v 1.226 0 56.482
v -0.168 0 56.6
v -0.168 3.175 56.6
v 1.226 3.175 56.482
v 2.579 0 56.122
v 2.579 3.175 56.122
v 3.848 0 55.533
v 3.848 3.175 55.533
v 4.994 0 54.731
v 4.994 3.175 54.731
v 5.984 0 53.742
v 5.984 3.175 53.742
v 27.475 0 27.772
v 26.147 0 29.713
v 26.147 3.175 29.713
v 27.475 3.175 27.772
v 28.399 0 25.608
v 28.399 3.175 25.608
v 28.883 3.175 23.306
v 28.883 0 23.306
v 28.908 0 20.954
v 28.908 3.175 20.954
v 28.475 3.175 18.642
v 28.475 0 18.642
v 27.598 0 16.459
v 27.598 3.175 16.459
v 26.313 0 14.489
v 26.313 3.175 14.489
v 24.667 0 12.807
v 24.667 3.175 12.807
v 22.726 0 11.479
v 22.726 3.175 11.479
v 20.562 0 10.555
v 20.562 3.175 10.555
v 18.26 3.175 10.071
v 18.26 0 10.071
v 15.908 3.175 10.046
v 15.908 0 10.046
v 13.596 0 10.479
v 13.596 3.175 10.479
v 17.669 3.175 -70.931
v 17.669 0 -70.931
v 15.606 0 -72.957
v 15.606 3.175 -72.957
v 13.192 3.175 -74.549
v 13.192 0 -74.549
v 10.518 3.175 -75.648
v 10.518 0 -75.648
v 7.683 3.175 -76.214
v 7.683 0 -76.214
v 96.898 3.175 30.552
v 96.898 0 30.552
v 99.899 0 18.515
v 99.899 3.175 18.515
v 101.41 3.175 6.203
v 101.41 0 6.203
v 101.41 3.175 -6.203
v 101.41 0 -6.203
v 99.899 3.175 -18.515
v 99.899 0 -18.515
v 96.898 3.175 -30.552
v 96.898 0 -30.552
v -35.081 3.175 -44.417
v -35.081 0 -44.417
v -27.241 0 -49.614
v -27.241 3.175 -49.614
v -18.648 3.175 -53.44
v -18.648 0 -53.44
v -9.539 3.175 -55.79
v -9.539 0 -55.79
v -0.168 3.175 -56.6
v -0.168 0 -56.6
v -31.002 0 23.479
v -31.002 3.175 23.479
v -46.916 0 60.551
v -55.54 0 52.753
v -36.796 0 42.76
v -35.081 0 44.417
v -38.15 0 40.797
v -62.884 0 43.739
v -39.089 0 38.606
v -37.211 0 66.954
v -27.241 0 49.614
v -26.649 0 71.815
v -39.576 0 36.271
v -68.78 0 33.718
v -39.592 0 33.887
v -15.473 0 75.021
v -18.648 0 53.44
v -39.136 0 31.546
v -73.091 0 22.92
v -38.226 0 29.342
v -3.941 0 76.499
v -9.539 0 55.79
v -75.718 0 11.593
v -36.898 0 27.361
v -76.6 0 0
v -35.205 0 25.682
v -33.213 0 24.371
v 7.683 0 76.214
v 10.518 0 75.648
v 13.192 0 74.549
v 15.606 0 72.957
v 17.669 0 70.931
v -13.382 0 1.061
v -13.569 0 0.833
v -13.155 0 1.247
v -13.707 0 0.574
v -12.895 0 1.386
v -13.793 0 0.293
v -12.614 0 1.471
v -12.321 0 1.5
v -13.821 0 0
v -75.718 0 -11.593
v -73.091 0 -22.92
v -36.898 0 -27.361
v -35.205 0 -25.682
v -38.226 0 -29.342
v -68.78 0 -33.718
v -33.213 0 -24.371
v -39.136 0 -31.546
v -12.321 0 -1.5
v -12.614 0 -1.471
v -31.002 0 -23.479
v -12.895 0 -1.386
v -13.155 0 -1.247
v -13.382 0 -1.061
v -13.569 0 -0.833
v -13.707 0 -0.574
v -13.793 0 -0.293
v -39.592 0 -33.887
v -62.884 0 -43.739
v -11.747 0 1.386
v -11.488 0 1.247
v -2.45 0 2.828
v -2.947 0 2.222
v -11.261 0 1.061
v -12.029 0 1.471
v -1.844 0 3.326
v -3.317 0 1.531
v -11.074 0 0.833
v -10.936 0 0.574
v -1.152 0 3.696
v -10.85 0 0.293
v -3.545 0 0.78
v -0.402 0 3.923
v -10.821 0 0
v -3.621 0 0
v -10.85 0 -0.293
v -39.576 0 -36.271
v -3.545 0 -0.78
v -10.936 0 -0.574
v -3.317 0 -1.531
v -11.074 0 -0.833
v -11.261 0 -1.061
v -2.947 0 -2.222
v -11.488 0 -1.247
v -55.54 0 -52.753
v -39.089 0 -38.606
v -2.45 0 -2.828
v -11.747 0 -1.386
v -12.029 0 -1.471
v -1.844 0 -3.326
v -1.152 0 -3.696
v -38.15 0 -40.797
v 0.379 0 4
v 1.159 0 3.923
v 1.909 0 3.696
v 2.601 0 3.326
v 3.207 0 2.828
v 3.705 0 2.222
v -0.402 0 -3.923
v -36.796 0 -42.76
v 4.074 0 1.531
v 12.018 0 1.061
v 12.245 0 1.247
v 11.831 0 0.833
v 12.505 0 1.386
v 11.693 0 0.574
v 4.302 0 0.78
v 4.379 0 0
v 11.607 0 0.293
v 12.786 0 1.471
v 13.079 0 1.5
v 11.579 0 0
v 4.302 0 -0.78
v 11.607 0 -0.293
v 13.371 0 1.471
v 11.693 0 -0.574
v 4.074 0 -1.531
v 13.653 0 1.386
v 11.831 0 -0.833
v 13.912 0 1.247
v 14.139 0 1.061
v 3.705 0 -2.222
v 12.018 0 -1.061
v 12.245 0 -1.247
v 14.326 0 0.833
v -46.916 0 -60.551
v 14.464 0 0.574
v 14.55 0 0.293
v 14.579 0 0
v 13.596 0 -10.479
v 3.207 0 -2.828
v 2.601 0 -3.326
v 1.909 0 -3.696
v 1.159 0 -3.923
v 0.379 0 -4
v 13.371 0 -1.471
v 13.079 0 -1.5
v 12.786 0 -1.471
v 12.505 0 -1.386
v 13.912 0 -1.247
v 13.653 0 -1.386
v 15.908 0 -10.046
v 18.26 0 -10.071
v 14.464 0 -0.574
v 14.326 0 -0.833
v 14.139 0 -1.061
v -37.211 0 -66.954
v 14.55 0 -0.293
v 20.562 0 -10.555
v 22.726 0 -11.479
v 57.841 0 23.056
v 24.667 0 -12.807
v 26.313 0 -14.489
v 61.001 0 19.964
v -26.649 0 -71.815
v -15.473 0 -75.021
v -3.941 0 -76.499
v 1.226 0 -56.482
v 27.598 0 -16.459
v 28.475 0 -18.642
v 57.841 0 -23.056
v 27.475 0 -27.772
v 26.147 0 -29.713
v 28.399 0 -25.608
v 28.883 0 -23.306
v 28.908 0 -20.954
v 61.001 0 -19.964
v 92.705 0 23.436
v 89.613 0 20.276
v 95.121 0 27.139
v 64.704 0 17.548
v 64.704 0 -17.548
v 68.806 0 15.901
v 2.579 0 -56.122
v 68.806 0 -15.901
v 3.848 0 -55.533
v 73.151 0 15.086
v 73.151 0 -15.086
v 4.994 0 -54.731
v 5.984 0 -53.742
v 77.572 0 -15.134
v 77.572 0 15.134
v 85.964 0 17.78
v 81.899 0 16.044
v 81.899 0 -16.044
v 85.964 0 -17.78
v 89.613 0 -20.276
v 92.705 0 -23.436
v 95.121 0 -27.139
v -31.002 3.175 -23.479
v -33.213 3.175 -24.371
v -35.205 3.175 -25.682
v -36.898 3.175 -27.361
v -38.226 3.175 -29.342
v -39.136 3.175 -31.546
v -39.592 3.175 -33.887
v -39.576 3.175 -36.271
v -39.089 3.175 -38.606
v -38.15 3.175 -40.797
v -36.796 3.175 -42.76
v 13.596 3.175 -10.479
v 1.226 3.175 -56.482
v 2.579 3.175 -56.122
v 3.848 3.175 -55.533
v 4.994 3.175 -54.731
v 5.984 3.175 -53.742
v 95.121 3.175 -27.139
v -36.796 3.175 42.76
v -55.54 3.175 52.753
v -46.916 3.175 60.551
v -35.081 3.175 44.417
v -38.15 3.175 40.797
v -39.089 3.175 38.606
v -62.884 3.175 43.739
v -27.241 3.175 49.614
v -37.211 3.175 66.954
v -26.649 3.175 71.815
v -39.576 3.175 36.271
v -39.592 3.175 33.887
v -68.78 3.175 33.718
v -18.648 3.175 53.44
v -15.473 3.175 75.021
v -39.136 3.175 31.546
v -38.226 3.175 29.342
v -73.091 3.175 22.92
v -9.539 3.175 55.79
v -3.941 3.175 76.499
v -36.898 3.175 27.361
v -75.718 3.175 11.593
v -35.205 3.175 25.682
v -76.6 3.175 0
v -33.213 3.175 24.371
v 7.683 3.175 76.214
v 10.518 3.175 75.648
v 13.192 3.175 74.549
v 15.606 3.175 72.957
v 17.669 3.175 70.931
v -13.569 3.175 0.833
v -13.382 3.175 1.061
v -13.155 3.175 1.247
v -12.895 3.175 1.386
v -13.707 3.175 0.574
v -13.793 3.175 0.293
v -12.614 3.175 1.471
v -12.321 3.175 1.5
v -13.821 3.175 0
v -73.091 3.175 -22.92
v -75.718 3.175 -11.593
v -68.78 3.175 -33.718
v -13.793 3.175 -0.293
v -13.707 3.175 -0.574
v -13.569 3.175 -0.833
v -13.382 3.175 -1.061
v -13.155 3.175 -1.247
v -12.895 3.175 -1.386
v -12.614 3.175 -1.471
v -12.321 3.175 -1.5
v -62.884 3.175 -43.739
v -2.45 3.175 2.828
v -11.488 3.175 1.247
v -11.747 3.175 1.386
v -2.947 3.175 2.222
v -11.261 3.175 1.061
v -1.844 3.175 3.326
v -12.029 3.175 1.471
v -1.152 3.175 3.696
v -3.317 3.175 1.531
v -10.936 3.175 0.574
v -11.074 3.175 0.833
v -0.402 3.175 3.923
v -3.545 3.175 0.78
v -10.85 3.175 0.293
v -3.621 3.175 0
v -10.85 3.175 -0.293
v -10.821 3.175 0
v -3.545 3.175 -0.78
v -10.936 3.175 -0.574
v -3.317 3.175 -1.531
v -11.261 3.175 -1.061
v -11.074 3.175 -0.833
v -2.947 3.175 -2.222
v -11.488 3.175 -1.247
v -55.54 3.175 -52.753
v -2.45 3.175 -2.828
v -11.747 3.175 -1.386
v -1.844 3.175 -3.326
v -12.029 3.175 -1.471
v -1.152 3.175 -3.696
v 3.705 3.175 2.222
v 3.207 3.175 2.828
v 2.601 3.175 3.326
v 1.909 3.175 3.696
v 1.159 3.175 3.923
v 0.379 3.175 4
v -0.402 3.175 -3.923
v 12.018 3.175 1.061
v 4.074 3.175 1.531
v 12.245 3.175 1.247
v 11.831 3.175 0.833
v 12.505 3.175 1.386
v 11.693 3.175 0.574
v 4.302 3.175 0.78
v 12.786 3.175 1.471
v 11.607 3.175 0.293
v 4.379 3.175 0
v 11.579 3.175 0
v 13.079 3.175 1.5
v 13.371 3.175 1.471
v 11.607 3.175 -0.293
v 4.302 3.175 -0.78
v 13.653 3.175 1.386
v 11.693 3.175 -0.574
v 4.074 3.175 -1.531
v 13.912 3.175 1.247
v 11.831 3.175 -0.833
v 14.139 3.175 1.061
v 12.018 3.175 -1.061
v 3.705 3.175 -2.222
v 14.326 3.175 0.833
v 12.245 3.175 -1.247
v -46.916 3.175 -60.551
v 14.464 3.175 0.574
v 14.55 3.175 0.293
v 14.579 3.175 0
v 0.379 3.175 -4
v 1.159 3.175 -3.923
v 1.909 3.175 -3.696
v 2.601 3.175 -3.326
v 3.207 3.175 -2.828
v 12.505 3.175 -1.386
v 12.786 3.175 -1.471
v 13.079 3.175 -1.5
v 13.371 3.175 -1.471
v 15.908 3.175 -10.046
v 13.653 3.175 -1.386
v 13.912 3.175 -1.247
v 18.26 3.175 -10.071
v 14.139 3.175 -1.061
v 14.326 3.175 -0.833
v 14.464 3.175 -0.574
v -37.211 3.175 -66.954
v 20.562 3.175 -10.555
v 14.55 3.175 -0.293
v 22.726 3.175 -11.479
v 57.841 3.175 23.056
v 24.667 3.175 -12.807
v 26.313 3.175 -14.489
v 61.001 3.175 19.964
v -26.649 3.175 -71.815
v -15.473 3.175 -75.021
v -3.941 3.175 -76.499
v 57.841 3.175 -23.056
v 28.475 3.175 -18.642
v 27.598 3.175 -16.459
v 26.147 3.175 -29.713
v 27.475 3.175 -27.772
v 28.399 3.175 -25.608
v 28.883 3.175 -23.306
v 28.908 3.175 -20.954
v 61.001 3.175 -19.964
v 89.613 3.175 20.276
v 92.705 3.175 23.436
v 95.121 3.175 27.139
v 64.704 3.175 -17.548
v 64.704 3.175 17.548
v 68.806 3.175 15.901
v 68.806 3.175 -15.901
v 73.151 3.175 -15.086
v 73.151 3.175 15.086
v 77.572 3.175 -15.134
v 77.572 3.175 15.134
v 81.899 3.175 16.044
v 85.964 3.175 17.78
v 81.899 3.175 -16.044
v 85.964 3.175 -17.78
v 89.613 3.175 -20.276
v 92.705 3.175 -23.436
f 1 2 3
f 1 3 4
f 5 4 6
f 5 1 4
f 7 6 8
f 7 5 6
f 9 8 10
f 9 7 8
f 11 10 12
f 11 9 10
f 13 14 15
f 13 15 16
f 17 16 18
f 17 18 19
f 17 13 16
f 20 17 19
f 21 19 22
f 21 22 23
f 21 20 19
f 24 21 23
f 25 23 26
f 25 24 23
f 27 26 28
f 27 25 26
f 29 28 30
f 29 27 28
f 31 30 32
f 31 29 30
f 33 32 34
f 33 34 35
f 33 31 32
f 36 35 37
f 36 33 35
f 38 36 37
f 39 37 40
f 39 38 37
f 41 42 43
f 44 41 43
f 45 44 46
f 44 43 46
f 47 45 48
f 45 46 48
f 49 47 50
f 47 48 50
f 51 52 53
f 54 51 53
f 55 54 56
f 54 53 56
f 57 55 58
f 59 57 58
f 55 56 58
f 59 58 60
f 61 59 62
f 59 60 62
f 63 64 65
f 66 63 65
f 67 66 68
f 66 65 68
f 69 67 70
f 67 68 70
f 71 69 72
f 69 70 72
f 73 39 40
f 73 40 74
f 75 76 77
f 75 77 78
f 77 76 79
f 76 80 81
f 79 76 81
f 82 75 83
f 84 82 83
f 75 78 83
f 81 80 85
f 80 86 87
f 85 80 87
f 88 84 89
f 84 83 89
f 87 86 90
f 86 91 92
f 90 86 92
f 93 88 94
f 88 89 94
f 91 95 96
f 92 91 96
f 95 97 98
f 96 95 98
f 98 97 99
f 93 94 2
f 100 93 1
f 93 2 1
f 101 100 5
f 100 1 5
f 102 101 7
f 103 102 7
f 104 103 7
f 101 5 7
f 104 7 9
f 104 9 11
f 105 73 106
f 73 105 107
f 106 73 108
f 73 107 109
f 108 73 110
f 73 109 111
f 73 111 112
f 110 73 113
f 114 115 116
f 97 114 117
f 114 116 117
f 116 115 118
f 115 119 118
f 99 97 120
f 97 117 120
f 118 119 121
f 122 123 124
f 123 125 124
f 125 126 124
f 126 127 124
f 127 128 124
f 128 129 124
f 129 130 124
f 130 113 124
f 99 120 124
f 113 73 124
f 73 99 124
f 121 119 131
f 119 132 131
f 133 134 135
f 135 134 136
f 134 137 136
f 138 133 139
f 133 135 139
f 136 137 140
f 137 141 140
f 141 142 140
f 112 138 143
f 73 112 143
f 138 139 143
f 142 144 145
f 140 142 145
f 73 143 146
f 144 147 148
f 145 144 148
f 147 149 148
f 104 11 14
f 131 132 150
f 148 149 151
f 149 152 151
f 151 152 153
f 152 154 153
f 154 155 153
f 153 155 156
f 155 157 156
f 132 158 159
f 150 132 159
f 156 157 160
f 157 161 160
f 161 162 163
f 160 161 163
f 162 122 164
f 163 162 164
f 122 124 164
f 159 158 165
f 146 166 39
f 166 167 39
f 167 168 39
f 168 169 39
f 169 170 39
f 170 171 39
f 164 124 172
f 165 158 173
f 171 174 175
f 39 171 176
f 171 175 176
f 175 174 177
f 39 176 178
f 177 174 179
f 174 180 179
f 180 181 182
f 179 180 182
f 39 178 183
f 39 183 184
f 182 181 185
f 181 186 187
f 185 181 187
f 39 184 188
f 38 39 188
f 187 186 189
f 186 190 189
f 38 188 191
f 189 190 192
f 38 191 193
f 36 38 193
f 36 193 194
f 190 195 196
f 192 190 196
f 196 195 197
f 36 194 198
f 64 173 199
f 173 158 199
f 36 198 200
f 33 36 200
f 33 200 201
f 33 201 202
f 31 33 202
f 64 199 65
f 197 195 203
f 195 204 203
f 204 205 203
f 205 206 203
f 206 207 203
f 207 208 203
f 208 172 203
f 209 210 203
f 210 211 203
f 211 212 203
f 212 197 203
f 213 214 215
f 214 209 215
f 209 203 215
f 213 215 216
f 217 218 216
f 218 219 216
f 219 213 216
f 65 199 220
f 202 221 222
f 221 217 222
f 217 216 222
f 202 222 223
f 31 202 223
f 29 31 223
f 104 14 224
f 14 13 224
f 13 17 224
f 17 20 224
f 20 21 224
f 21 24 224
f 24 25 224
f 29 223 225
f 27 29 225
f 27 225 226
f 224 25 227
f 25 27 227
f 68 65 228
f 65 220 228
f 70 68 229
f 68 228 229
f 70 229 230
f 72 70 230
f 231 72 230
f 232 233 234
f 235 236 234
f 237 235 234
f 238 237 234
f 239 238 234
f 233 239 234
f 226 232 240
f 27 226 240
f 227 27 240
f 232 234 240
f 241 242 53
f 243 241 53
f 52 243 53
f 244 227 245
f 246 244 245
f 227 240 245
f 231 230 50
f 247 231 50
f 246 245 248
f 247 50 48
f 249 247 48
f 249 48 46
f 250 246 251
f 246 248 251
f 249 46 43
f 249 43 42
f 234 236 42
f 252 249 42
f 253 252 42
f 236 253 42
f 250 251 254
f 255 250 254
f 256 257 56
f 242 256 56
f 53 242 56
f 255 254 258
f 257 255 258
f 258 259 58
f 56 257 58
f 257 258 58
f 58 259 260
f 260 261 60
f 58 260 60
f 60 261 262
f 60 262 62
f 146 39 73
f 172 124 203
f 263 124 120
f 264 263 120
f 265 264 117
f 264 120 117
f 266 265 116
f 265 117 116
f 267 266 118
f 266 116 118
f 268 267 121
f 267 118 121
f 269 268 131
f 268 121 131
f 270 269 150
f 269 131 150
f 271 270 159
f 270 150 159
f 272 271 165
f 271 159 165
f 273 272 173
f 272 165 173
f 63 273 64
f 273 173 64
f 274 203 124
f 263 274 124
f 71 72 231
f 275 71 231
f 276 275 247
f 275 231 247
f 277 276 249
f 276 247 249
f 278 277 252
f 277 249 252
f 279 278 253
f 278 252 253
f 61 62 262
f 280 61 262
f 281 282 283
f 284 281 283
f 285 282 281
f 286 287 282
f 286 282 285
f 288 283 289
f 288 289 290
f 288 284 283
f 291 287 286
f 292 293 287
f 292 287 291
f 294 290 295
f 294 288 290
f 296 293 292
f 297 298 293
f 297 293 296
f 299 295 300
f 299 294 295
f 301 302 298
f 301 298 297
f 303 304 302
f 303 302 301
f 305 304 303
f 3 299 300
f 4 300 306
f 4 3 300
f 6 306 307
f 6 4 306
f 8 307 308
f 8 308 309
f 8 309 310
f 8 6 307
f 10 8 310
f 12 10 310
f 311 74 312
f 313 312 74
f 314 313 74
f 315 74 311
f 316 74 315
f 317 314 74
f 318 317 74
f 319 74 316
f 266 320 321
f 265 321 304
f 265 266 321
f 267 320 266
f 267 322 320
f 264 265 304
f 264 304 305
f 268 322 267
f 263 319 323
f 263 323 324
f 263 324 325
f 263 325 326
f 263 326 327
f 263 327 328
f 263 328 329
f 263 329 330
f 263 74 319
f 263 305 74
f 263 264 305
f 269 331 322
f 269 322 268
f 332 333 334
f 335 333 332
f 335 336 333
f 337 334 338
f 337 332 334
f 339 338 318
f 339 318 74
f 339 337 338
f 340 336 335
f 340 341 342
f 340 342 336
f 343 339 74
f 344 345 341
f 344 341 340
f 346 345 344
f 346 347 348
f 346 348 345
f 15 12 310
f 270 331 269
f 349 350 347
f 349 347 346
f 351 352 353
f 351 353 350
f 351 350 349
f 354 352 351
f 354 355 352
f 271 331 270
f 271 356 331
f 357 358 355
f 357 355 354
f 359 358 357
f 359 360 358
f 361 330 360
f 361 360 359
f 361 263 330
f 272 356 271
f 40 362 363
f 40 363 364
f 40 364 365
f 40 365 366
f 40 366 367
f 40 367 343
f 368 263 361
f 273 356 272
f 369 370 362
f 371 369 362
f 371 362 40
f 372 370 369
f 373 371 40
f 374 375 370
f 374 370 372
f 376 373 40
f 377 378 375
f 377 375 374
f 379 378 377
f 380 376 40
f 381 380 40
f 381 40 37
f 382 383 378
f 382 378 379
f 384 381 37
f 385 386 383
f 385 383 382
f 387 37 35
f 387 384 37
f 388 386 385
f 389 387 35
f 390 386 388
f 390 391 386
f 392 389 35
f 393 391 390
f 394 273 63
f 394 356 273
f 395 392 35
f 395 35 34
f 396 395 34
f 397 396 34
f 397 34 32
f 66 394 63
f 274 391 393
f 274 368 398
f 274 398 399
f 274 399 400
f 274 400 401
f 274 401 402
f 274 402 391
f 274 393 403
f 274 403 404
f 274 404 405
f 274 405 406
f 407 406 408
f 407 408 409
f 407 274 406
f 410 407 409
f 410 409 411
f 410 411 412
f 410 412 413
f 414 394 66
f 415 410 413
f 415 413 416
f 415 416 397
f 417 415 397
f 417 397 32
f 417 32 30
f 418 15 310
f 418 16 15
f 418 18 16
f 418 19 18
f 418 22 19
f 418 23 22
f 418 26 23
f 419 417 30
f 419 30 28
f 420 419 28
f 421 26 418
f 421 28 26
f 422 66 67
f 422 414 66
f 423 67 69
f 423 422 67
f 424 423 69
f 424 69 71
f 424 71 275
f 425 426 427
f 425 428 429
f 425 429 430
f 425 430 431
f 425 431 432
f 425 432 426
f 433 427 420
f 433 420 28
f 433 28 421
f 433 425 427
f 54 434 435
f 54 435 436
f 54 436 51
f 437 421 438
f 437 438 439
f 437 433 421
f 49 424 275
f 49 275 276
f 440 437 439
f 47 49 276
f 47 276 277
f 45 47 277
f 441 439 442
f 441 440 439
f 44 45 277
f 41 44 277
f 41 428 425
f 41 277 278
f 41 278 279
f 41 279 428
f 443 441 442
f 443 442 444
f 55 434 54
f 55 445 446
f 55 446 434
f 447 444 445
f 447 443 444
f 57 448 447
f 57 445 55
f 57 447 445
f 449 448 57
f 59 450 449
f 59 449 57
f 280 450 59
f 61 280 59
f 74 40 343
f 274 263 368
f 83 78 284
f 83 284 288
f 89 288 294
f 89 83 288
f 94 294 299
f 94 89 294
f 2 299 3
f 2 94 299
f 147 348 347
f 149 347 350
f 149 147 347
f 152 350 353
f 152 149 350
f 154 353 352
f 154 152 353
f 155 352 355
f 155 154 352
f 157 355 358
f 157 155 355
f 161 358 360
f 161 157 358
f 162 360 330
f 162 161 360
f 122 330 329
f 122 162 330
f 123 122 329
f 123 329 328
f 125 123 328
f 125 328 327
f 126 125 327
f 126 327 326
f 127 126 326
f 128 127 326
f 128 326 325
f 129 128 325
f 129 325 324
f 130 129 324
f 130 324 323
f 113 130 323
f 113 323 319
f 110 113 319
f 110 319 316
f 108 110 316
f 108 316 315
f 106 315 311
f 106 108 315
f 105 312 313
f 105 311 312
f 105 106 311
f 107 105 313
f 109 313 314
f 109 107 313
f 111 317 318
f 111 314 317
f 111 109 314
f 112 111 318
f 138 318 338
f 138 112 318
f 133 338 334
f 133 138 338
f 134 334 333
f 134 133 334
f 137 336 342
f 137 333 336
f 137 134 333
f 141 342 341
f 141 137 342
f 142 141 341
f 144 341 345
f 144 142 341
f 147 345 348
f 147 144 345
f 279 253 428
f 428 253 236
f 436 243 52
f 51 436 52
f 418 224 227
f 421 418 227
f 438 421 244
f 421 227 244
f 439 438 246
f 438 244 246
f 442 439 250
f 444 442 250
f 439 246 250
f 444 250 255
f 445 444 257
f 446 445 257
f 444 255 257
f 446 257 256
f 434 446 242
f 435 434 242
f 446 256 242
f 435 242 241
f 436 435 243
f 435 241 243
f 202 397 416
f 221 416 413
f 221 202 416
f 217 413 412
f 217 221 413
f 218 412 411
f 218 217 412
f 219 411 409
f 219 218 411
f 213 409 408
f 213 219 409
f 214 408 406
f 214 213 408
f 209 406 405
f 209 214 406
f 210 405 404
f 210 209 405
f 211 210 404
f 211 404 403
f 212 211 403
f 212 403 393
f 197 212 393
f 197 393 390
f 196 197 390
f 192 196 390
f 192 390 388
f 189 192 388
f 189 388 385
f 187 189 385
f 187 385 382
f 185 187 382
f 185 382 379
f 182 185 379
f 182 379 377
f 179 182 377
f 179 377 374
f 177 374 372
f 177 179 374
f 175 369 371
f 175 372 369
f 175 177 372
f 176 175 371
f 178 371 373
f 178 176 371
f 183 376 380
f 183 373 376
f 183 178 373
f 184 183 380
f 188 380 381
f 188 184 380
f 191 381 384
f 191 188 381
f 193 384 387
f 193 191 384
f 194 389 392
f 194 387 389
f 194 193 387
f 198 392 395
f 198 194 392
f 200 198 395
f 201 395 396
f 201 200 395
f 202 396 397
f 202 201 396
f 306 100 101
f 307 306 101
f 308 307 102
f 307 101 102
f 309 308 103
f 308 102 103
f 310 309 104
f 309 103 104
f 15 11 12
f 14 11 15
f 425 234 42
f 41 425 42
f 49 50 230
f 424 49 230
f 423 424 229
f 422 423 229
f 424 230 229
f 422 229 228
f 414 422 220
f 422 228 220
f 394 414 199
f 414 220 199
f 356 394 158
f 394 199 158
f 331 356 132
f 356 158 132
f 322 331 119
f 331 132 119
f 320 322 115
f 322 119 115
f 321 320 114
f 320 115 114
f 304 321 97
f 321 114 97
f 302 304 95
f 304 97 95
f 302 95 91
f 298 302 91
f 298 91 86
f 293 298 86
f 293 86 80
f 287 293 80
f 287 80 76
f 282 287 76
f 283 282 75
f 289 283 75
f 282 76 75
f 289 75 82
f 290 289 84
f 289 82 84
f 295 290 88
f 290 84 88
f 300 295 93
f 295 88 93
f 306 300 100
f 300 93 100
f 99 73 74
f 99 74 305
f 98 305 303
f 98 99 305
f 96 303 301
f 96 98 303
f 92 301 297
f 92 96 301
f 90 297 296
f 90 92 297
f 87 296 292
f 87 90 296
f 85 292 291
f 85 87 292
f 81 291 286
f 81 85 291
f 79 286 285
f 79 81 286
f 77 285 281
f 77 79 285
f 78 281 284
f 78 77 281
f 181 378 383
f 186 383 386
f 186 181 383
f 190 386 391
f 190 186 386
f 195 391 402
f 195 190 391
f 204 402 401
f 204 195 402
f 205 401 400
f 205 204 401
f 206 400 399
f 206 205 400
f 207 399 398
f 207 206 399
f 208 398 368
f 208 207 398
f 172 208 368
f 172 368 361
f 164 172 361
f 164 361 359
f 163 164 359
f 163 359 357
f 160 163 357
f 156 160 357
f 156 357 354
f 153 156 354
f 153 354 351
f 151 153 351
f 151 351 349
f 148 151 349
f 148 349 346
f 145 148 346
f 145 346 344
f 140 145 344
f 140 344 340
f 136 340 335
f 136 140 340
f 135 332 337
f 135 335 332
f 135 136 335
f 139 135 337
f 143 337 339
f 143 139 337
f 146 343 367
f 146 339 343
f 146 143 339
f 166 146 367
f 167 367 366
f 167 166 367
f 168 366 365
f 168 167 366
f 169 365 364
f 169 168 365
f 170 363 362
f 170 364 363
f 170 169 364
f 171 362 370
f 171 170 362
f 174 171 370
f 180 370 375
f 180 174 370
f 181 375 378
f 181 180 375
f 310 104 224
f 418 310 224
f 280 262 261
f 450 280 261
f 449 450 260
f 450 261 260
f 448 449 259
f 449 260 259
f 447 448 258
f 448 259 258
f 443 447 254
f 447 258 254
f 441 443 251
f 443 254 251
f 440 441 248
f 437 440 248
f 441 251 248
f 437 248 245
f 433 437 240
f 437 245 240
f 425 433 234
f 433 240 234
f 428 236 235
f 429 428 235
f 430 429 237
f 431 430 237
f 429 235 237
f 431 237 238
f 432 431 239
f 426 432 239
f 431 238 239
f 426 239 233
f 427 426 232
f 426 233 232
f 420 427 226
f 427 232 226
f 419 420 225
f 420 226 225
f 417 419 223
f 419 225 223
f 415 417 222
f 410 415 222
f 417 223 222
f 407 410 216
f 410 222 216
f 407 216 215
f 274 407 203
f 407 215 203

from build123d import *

# Parameters (mm, degrees)
BOSS_EXTRUDE1_DEPTH = 3.175
SKETCH2_R           = 4
CUT_EXTRUDE3_DEPTH  = 4.175
SKETCH3_R           = 1.5
CUT_EXTRUDE4_DEPTH  = 4.175


with BuildPart() as part:
    # Sketch1 → Boss-Extrude1 (new body)
    with BuildSketch(Plane(origin=(0, 0, 0), x_dir=(1, 0, 0), z_dir=(0, 1, 0))):
        with BuildLine():
            Line((96.897642196, 30.55170923), (95.120945792, 27.138707192))
            ThreePointArc((95.120945792, 27.138707192), (77.57215373, 15.134042144), (57.841053042, 23.055894918))
            Line((57.841053042, 23.055894918), (17.668897816, 70.931205231))
            ThreePointArc((17.668897816, 70.931205231), (13.19211244, 74.548556577), (7.682670578, 76.213755798))
            ThreePointArc((7.682670578, 76.213755798), (-76.6, 0), (7.682670578, -76.213755798))
            ThreePointArc((7.682670578, -76.213755798), (13.19211244, -74.548556577), (17.668897816, -70.931205231))
            Line((17.668897816, -70.931205231), (57.841053042, -23.055894918))
            ThreePointArc((57.841053042, -23.055894918), (77.57215373, -15.134042144), (95.120945792, -27.138707192))
            Line((95.120945792, -27.138707192), (96.897642196, -30.55170923))
            ThreePointArc((96.897642196, -30.55170923), (101.6, 0), (96.897642196, 30.55170923))
        make_face()
        with BuildLine():
            Line((5.98413489, 53.742086889), (26.146554137, 29.713451316))
            ThreePointArc((26.146554137, 29.713451316), (27.003715662, 15.442284424), (13.595828747, 10.479472842))
            Line((13.595828747, 10.479472842), (-31.001636142, 23.479472842))
            ThreePointArc((-31.001636142, 23.479472842), (-39.421951774, 32.705058554), (-35.081142025, 44.417040359))
            ThreePointArc((-35.081142025, 44.417040359), (-18.647504357, 53.439971756), (-0.16796068, 56.599750788))
            ThreePointArc((-0.16796068, 56.599750788), (3.225963821, 55.855256817), (5.98413489, 53.742086889))
        make_face(mode=Mode.SUBTRACT)
        with BuildLine():
            Line((5.98413489, -53.742086889), (26.146554137, -29.713451316))
            ThreePointArc((26.146554137, -29.713451316), (27.003715662, -15.442284424), (13.595828747, -10.479472842))
            Line((13.595828747, -10.479472842), (-31.001636142, -23.479472842))
            ThreePointArc((-31.001636142, -23.479472842), (-39.421951774, -32.705058554), (-35.081142025, -44.417040359))
            ThreePointArc((-35.081142025, -44.417040359), (-18.647504357, -53.439971756), (-0.16796068, -56.599750788))
            ThreePointArc((-0.16796068, -56.599750788), (3.225963821, -55.855256817), (5.98413489, -53.742086889))
        make_face(mode=Mode.SUBTRACT)
    extrude(amount=BOSS_EXTRUDE1_DEPTH)

    # Sketch2 → Cut-Extrude3 (cut, through all)
    with BuildSketch(Plane(origin=(0, 0, 0), x_dir=(1, 0, 0), z_dir=(0, 1, 0))):
        with Locations((0.378636362, 0)):
            Circle(SKETCH2_R)
    extrude(amount=CUT_EXTRUDE3_DEPTH, mode=Mode.SUBTRACT)

    # Sketch3 → Cut-Extrude4 (cut, through all)
    with BuildSketch(Plane(origin=(0, 0, 0), x_dir=(1, 0, 0), z_dir=(0, 1, 0))):
        with Locations((-12.321363638, 0)):
            Circle(SKETCH3_R)
        with Locations((13.078636362, 0)):
            Circle(SKETCH3_R)
    extrude(amount=CUT_EXTRUDE4_DEPTH, mode=Mode.SUBTRACT)


solid = part.part
